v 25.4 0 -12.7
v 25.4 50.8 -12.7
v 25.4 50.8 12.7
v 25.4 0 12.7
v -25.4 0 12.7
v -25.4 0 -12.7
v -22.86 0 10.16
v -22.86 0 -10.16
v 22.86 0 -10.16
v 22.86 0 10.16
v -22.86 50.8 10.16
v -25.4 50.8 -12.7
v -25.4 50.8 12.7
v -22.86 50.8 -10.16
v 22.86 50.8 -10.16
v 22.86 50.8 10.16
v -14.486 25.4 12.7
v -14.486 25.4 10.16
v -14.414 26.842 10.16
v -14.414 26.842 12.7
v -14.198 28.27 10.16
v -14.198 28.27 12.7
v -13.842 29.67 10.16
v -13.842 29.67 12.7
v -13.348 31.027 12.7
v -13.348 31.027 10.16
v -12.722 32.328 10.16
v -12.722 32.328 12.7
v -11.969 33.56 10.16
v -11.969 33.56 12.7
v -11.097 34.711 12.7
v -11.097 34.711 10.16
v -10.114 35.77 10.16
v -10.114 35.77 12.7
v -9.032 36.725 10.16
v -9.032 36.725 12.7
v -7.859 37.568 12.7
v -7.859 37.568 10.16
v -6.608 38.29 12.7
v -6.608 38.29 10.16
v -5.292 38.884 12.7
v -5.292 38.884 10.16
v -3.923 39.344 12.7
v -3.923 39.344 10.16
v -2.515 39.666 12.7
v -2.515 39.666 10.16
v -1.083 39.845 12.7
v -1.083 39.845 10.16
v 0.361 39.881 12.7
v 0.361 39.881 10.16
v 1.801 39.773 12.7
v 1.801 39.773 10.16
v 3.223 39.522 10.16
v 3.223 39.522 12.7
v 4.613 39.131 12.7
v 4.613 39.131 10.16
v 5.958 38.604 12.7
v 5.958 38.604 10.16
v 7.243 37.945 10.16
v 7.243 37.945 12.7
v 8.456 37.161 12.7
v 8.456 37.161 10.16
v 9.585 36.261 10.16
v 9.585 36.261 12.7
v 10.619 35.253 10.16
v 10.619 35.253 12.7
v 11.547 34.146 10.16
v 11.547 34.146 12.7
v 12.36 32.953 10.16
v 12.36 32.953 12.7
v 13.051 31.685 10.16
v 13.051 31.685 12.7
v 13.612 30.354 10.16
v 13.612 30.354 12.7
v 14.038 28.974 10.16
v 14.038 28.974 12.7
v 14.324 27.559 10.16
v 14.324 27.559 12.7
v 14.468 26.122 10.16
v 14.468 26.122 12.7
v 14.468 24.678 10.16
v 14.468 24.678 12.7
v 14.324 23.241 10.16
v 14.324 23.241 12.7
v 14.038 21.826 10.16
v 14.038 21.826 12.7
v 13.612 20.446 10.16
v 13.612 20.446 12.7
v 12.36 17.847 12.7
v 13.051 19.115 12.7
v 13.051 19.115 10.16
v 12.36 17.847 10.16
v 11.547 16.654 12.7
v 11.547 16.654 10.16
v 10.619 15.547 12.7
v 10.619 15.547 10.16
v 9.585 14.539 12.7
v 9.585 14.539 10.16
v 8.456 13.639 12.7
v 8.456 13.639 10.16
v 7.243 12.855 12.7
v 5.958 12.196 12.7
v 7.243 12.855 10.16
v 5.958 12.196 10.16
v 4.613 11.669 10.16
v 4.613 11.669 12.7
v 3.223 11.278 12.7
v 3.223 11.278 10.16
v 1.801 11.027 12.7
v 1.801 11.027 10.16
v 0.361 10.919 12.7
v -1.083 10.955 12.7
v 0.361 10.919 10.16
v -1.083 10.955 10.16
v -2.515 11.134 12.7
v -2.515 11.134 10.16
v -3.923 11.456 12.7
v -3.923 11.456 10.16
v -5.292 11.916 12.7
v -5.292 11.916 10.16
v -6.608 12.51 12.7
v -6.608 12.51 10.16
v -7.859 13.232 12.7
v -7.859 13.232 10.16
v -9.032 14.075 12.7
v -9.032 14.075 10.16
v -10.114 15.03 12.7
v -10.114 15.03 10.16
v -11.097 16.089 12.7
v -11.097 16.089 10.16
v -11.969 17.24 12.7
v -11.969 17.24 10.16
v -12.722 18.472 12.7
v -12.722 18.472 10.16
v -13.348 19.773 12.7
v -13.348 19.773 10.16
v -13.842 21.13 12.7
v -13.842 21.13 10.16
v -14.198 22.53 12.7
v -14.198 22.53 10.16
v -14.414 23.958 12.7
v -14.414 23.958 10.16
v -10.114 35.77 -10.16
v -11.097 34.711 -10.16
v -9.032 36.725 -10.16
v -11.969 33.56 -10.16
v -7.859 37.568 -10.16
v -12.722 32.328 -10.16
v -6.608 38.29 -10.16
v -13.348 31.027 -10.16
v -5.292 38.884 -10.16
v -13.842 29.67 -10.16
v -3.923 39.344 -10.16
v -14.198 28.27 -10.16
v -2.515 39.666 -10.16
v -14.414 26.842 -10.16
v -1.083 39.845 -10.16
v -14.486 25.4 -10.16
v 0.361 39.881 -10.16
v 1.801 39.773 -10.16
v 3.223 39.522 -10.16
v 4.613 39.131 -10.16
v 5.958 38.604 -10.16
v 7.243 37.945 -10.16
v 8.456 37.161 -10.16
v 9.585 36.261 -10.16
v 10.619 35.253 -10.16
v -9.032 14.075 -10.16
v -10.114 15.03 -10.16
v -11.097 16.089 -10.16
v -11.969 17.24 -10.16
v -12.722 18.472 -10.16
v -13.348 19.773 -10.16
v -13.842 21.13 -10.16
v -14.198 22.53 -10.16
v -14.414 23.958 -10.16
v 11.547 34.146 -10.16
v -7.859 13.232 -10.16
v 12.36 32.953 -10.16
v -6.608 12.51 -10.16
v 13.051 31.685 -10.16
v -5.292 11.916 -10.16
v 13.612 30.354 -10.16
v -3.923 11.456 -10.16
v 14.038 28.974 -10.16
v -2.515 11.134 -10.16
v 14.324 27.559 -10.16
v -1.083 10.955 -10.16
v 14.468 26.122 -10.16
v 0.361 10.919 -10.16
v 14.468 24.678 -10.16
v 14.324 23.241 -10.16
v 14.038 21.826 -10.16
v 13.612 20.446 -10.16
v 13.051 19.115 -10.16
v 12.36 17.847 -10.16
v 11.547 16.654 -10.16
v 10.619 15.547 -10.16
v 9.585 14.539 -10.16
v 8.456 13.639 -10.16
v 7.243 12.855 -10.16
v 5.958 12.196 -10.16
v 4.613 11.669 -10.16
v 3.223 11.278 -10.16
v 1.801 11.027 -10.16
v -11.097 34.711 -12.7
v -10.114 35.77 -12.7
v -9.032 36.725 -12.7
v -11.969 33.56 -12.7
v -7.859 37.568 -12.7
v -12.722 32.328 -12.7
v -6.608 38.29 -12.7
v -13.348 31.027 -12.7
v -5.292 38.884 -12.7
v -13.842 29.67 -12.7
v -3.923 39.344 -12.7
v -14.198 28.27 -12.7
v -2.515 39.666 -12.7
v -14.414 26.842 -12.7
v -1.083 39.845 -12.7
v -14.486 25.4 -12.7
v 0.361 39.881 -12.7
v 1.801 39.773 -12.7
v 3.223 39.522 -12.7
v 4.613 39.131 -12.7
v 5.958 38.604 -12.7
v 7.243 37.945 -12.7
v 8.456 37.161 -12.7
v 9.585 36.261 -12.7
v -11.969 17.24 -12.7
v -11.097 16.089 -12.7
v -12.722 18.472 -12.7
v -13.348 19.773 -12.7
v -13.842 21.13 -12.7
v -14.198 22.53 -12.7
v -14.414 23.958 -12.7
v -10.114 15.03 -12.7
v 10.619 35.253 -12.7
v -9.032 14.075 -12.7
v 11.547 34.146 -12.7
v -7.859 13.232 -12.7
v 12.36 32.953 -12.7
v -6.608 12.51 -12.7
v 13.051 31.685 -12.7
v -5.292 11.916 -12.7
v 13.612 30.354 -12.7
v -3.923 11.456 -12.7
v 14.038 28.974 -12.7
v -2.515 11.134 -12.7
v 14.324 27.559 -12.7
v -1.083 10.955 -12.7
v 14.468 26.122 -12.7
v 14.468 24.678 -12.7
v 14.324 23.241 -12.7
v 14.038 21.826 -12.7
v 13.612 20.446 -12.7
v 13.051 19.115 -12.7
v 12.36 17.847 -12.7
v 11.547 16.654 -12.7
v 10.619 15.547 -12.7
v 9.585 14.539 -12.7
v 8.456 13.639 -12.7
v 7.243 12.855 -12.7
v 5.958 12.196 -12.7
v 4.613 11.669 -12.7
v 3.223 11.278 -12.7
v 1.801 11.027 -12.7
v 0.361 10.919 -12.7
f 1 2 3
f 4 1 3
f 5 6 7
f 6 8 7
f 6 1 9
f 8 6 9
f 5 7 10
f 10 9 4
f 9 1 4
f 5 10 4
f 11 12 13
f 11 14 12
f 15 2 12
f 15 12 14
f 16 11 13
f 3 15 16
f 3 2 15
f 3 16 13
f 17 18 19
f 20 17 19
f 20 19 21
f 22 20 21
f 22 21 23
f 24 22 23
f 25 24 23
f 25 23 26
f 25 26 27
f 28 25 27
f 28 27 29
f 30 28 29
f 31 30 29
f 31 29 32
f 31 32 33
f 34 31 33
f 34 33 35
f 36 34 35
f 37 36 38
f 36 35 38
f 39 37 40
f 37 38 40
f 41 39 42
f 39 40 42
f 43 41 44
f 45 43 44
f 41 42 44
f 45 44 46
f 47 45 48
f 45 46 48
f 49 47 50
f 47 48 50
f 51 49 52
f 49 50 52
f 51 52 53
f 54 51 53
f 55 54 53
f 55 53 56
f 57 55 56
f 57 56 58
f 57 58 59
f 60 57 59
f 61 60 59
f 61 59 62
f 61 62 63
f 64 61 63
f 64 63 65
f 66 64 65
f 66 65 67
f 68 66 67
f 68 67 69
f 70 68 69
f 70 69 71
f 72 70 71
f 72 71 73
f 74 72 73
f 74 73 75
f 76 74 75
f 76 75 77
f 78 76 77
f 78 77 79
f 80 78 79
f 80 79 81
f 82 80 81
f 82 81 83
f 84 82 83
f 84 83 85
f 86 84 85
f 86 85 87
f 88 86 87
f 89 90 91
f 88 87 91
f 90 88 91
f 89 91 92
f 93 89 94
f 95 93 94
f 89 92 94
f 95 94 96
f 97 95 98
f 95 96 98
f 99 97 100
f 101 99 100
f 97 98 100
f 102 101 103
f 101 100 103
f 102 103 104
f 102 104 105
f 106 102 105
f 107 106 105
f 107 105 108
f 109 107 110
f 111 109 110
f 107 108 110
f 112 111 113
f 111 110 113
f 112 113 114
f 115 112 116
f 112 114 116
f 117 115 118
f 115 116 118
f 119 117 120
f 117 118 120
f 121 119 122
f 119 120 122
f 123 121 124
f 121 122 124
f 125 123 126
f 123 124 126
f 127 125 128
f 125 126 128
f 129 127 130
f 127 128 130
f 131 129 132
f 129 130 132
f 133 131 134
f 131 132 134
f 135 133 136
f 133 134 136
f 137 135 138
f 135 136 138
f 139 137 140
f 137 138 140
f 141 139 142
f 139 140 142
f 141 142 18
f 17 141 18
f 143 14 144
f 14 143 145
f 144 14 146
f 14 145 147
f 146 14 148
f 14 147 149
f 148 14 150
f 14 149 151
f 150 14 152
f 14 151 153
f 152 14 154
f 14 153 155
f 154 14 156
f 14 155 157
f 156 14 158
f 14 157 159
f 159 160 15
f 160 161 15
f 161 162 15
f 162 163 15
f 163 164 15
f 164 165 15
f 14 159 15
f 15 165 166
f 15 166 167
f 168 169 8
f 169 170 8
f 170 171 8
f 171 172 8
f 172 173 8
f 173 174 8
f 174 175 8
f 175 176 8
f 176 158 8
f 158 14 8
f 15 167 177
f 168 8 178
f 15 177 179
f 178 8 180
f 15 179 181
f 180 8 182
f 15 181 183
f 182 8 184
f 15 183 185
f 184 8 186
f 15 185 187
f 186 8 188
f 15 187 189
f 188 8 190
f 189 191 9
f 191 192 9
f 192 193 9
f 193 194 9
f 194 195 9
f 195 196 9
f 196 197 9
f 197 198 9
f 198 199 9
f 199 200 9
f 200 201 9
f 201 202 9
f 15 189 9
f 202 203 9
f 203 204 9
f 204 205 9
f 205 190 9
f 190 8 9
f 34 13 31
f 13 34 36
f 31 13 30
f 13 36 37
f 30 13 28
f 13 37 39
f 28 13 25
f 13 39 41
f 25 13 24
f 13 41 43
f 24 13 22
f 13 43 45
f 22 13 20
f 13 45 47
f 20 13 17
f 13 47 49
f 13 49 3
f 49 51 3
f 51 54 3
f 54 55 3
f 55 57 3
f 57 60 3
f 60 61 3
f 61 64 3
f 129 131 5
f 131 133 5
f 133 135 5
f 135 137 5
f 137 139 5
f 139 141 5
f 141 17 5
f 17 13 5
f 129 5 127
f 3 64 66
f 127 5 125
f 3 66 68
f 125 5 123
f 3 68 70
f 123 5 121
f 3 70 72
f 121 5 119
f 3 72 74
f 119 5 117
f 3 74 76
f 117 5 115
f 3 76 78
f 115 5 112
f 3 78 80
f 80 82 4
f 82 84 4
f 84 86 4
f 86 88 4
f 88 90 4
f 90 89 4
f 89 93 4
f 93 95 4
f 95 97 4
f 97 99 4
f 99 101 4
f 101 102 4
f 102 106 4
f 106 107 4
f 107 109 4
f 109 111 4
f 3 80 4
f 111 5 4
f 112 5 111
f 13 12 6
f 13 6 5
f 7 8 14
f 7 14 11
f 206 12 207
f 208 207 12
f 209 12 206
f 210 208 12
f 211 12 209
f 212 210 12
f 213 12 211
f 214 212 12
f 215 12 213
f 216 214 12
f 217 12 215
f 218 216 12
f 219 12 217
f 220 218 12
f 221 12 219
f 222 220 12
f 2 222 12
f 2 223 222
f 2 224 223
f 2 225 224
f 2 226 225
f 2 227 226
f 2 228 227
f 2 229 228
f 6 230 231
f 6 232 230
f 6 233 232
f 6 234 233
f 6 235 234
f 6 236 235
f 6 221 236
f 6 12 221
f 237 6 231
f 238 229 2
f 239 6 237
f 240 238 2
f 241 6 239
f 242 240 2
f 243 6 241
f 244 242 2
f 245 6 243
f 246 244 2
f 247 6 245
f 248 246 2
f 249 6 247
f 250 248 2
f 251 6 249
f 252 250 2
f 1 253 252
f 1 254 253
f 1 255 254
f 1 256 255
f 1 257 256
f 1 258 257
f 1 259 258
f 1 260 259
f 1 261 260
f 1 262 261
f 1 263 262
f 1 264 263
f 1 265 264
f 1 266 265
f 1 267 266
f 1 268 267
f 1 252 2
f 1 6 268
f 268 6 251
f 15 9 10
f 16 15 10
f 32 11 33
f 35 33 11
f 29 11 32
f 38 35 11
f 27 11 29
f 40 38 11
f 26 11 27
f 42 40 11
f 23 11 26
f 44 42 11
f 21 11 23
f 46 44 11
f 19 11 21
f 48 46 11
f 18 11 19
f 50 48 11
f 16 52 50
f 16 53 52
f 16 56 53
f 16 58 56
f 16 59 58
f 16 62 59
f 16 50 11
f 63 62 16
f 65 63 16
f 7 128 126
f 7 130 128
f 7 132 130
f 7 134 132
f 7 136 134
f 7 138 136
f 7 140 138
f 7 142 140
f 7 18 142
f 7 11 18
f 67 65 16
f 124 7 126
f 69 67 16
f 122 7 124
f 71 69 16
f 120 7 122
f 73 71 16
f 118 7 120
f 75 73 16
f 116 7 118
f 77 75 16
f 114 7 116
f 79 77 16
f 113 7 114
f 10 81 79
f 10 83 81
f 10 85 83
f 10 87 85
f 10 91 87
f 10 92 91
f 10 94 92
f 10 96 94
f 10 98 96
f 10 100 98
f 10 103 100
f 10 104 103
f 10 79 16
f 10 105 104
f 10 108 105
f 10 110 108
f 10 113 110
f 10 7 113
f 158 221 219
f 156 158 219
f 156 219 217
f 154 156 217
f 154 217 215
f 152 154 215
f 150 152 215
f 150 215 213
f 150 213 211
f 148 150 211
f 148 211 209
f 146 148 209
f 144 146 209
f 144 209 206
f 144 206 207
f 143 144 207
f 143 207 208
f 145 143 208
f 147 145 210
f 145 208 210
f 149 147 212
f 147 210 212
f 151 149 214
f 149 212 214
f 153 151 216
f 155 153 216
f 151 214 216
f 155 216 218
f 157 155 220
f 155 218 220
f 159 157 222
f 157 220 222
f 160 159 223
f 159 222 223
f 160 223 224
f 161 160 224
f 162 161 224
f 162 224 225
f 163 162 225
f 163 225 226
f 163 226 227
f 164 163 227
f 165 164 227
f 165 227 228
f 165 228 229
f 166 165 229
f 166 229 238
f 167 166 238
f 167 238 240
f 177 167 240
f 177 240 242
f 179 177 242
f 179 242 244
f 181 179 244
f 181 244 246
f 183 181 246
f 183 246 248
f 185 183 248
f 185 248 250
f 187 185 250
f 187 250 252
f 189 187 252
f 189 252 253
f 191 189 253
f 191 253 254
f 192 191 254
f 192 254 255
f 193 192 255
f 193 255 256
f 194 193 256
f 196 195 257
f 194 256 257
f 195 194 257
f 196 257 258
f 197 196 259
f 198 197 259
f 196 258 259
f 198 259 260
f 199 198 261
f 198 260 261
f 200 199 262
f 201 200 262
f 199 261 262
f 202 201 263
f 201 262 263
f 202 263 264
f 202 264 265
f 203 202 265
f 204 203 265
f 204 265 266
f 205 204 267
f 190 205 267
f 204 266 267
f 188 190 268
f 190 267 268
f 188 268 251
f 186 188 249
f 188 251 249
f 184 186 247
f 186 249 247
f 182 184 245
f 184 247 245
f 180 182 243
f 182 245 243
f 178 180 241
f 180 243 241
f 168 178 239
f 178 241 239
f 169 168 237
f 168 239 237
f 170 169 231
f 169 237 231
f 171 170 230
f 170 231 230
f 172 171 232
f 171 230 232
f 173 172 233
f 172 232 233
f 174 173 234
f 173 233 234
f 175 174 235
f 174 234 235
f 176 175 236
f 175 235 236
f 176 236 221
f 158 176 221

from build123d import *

# Parameters (mm, degrees)
SKETCH12_W                         = 25.4
SKETCH12_H                         = 50.8
SKETCH12_W_2                       = 20.32
SKETCH12_H_2                       = 45.72
RECTANGULAR_TUBE_2IN_X_1IN_1_DEPTH = 50.8
F_1_1_8_CLEARANCE_HOLE1_D          = 28.97124


with BuildPart() as part:
    # Sketch12 → Rectangular tube 2IN X 1IN(1) (new body)
    with BuildSketch(Plane(origin=(-25.4, 0, -12.7), x_dir=(0, 0, 1), z_dir=(0, 1, 0))):
        with Locations((12.7, 25.4)):
            Rectangle(SKETCH12_W, SKETCH12_H)
        with Locations((12.7, 25.4)):
            Rectangle(SKETCH12_W_2, SKETCH12_H_2, mode=Mode.SUBTRACT)
    extrude(amount=RECTANGULAR_TUBE_2IN_X_1IN_1_DEPTH)

    # 1-1/8 Clearance Hole1 (through all)
    with Locations(Plane.XY.offset(12.7)):
        with Locations((0, 25.4)):
            Hole(F_1_1_8_CLEARANCE_HOLE1_D / 2)


solid = part.part
